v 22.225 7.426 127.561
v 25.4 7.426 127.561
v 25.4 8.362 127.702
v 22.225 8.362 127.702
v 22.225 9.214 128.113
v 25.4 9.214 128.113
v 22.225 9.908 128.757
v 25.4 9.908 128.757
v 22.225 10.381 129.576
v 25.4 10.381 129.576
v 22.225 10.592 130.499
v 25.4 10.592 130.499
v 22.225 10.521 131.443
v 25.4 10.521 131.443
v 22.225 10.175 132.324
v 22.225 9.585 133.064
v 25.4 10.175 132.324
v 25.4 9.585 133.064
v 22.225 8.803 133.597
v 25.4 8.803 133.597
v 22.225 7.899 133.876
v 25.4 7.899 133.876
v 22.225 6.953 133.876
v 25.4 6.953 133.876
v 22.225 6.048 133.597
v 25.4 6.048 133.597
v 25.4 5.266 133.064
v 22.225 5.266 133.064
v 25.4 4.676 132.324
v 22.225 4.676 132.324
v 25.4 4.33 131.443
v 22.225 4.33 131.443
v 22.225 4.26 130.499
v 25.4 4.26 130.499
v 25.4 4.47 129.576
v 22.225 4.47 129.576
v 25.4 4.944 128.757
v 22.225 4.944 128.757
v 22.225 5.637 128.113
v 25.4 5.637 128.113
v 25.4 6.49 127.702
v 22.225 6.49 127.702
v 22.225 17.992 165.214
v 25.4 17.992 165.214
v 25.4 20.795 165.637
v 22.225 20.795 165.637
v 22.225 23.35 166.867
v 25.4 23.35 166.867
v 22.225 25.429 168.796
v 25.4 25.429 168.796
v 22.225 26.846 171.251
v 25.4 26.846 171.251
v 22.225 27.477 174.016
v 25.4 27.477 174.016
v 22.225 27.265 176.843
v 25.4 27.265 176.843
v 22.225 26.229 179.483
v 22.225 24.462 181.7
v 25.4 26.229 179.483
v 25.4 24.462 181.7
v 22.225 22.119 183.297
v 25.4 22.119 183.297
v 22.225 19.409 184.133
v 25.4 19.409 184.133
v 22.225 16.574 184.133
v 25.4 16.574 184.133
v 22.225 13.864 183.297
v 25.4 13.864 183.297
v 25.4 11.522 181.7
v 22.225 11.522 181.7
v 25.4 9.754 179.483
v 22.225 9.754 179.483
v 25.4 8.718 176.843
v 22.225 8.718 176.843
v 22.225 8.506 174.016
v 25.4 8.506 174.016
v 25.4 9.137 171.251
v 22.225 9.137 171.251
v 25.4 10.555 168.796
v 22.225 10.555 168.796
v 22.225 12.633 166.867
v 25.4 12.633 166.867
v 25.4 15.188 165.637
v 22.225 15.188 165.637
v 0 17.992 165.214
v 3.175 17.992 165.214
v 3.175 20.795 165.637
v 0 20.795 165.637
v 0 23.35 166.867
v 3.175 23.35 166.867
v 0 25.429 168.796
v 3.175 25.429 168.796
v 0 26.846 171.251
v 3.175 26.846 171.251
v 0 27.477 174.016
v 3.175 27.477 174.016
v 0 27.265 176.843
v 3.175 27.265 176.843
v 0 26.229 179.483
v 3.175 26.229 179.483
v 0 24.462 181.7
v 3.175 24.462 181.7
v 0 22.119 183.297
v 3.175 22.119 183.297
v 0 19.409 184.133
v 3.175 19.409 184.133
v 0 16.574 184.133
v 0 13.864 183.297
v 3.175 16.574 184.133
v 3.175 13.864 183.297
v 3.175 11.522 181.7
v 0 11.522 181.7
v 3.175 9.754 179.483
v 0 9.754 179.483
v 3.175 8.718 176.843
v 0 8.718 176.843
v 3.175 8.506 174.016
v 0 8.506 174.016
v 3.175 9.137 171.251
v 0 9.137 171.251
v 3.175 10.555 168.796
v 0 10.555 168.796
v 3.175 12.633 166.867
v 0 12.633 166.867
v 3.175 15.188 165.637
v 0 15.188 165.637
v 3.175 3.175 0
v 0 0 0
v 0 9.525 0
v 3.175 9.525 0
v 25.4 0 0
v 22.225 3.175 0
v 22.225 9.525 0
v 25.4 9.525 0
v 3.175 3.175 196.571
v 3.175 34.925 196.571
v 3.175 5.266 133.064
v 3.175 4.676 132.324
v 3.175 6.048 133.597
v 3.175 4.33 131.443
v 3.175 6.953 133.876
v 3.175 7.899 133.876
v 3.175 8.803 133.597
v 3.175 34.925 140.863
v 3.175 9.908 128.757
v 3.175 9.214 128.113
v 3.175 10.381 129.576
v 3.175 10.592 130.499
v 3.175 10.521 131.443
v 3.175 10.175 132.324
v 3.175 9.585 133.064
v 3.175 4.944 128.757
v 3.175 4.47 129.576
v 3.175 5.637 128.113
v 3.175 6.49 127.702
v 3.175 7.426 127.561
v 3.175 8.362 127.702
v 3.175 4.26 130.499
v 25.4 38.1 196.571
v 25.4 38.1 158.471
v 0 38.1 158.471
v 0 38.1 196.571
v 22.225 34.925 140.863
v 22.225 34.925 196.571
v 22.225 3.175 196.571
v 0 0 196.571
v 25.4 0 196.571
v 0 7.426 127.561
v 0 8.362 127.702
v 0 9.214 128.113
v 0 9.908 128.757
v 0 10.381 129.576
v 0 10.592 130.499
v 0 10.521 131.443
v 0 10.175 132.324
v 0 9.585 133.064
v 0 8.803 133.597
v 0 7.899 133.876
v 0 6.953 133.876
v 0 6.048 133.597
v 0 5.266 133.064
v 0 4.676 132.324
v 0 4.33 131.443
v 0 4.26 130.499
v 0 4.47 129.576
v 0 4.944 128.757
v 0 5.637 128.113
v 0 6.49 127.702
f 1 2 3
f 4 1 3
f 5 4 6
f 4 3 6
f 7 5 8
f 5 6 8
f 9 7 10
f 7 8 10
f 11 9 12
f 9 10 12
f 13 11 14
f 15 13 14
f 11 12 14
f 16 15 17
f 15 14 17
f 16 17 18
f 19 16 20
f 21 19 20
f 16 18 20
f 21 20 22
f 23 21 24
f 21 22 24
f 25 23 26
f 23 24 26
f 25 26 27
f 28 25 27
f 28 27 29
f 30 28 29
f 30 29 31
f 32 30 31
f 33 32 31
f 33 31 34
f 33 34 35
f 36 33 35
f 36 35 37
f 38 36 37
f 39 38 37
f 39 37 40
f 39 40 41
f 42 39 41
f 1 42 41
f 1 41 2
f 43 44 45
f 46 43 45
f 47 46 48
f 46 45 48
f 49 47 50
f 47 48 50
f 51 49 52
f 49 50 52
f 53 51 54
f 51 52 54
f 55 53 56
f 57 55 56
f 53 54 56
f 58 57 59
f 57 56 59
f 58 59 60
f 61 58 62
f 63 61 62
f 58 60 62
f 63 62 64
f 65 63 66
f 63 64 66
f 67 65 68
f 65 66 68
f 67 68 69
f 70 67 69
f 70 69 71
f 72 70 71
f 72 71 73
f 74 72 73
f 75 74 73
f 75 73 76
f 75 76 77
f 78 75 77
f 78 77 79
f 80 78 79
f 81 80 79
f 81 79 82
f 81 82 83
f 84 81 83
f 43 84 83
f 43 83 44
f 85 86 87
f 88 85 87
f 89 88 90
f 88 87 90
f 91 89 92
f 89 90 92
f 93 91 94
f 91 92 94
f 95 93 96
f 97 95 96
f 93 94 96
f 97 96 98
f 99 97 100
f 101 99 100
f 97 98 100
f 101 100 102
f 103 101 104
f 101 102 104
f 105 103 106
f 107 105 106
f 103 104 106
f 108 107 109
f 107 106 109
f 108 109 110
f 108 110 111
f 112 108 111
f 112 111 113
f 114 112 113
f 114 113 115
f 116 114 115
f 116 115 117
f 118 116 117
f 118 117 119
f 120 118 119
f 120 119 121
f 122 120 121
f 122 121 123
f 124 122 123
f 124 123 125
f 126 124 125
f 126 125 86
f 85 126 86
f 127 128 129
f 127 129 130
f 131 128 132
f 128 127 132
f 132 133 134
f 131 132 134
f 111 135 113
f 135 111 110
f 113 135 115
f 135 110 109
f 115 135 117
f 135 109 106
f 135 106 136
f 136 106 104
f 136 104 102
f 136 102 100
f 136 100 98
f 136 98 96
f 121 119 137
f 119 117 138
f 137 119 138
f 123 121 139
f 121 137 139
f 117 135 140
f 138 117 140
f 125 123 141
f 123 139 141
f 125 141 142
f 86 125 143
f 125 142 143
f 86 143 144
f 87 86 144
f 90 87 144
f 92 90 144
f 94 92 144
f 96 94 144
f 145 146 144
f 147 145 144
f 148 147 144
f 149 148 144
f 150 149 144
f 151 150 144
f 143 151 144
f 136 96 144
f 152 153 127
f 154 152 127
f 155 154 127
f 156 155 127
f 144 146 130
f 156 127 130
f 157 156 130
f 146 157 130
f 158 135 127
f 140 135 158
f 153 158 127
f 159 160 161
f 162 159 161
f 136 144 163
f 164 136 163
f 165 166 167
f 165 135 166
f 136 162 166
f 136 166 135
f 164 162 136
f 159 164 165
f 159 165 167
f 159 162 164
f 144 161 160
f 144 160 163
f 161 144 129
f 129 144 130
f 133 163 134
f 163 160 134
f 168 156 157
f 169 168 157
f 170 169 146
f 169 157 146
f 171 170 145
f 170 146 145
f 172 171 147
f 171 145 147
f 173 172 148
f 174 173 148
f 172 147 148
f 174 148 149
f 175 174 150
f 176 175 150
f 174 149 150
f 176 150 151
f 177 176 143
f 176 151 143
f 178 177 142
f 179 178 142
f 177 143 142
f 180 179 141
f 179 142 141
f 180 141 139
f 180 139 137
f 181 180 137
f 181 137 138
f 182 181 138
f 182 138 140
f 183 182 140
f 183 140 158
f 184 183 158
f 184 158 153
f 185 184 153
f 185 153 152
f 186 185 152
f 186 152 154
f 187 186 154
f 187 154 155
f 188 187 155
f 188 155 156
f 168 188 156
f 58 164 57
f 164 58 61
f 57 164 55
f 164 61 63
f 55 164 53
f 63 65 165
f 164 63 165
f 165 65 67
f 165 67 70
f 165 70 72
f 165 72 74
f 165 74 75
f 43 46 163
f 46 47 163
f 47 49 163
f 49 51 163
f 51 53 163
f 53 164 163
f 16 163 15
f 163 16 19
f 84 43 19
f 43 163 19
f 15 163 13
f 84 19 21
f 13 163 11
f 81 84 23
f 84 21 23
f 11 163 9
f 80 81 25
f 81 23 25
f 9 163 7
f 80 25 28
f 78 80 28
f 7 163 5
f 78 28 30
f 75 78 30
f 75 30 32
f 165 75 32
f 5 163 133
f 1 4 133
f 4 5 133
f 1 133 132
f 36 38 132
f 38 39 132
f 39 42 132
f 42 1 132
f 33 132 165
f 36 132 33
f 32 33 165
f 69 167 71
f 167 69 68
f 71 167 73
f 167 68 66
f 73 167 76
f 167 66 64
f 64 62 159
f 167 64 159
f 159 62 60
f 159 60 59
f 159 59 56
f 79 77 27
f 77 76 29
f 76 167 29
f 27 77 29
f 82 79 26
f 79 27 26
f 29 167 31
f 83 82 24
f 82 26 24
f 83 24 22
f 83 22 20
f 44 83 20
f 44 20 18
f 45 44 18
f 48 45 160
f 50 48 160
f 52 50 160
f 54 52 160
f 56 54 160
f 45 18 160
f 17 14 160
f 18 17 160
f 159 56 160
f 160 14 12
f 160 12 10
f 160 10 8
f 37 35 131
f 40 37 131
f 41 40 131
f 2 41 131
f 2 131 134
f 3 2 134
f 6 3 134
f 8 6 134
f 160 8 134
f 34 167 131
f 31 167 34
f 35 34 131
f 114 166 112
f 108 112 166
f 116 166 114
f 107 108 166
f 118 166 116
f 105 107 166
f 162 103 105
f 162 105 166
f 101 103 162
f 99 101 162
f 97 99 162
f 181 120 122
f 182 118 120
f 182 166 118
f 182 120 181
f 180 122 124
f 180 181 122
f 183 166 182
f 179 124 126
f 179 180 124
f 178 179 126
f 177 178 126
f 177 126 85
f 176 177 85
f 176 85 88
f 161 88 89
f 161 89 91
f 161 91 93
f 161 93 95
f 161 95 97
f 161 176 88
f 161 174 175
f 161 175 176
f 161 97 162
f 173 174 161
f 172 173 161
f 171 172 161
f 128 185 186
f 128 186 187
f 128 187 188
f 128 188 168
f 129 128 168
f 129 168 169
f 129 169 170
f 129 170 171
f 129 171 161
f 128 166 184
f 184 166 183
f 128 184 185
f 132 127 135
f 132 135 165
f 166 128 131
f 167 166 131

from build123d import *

# Parameters (mm, degrees)
SKETCH1_W           = 3.175
SKETCH1_H           = 38.1
SKETCH1_W_2         = 19.05
SKETCH1_H_2         = 3.175
BOSS_EXTRUDE1_DEPTH = 196.5706
SKETCH2_R           = 9.5123
SKETCH2_R_2         = 3.175
SIDE_CUT_DEPTH      = 26.4


with BuildPart() as part:
    # Sketch1 → Boss-Extrude1 (new body)
    with BuildSketch(Plane.XY):
        with Locations((1.5875, 19.05)):
            Rectangle(SKETCH1_W, SKETCH1_H)
        with Locations((12.7, 1.5875)):
            Rectangle(SKETCH1_W_2, SKETCH1_H_2)
        Polygon((22.225, 3.175), (22.225, 0), (25.4, 0), (25.4, 38.1), (22.225, 38.1), (22.225, 34.925), align=None)
        with Locations((12.7, 36.5125)):
            Rectangle(SKETCH1_W_2, SKETCH1_H_2)
    extrude(amount=BOSS_EXTRUDE1_DEPTH)

    # Sketch2 → Side cut (cut, through all)
    with BuildSketch(Plane(origin=(25.4, 0, 0), x_dir=(0, 0, -1), z_dir=(1, 0, 0))):
        with Locations((-174.7266, 17.991529913)):
            Circle(SKETCH2_R)
        with Locations((-130.736416842, 7.4258361)):
            Circle(SKETCH2_R_2)
        Polygon((-158.4706, 38.1), (0, 9.525), (0, 38.1), align=None)
    extrude(amount=-SIDE_CUT_DEPTH, mode=Mode.SUBTRACT)


solid = part.part
